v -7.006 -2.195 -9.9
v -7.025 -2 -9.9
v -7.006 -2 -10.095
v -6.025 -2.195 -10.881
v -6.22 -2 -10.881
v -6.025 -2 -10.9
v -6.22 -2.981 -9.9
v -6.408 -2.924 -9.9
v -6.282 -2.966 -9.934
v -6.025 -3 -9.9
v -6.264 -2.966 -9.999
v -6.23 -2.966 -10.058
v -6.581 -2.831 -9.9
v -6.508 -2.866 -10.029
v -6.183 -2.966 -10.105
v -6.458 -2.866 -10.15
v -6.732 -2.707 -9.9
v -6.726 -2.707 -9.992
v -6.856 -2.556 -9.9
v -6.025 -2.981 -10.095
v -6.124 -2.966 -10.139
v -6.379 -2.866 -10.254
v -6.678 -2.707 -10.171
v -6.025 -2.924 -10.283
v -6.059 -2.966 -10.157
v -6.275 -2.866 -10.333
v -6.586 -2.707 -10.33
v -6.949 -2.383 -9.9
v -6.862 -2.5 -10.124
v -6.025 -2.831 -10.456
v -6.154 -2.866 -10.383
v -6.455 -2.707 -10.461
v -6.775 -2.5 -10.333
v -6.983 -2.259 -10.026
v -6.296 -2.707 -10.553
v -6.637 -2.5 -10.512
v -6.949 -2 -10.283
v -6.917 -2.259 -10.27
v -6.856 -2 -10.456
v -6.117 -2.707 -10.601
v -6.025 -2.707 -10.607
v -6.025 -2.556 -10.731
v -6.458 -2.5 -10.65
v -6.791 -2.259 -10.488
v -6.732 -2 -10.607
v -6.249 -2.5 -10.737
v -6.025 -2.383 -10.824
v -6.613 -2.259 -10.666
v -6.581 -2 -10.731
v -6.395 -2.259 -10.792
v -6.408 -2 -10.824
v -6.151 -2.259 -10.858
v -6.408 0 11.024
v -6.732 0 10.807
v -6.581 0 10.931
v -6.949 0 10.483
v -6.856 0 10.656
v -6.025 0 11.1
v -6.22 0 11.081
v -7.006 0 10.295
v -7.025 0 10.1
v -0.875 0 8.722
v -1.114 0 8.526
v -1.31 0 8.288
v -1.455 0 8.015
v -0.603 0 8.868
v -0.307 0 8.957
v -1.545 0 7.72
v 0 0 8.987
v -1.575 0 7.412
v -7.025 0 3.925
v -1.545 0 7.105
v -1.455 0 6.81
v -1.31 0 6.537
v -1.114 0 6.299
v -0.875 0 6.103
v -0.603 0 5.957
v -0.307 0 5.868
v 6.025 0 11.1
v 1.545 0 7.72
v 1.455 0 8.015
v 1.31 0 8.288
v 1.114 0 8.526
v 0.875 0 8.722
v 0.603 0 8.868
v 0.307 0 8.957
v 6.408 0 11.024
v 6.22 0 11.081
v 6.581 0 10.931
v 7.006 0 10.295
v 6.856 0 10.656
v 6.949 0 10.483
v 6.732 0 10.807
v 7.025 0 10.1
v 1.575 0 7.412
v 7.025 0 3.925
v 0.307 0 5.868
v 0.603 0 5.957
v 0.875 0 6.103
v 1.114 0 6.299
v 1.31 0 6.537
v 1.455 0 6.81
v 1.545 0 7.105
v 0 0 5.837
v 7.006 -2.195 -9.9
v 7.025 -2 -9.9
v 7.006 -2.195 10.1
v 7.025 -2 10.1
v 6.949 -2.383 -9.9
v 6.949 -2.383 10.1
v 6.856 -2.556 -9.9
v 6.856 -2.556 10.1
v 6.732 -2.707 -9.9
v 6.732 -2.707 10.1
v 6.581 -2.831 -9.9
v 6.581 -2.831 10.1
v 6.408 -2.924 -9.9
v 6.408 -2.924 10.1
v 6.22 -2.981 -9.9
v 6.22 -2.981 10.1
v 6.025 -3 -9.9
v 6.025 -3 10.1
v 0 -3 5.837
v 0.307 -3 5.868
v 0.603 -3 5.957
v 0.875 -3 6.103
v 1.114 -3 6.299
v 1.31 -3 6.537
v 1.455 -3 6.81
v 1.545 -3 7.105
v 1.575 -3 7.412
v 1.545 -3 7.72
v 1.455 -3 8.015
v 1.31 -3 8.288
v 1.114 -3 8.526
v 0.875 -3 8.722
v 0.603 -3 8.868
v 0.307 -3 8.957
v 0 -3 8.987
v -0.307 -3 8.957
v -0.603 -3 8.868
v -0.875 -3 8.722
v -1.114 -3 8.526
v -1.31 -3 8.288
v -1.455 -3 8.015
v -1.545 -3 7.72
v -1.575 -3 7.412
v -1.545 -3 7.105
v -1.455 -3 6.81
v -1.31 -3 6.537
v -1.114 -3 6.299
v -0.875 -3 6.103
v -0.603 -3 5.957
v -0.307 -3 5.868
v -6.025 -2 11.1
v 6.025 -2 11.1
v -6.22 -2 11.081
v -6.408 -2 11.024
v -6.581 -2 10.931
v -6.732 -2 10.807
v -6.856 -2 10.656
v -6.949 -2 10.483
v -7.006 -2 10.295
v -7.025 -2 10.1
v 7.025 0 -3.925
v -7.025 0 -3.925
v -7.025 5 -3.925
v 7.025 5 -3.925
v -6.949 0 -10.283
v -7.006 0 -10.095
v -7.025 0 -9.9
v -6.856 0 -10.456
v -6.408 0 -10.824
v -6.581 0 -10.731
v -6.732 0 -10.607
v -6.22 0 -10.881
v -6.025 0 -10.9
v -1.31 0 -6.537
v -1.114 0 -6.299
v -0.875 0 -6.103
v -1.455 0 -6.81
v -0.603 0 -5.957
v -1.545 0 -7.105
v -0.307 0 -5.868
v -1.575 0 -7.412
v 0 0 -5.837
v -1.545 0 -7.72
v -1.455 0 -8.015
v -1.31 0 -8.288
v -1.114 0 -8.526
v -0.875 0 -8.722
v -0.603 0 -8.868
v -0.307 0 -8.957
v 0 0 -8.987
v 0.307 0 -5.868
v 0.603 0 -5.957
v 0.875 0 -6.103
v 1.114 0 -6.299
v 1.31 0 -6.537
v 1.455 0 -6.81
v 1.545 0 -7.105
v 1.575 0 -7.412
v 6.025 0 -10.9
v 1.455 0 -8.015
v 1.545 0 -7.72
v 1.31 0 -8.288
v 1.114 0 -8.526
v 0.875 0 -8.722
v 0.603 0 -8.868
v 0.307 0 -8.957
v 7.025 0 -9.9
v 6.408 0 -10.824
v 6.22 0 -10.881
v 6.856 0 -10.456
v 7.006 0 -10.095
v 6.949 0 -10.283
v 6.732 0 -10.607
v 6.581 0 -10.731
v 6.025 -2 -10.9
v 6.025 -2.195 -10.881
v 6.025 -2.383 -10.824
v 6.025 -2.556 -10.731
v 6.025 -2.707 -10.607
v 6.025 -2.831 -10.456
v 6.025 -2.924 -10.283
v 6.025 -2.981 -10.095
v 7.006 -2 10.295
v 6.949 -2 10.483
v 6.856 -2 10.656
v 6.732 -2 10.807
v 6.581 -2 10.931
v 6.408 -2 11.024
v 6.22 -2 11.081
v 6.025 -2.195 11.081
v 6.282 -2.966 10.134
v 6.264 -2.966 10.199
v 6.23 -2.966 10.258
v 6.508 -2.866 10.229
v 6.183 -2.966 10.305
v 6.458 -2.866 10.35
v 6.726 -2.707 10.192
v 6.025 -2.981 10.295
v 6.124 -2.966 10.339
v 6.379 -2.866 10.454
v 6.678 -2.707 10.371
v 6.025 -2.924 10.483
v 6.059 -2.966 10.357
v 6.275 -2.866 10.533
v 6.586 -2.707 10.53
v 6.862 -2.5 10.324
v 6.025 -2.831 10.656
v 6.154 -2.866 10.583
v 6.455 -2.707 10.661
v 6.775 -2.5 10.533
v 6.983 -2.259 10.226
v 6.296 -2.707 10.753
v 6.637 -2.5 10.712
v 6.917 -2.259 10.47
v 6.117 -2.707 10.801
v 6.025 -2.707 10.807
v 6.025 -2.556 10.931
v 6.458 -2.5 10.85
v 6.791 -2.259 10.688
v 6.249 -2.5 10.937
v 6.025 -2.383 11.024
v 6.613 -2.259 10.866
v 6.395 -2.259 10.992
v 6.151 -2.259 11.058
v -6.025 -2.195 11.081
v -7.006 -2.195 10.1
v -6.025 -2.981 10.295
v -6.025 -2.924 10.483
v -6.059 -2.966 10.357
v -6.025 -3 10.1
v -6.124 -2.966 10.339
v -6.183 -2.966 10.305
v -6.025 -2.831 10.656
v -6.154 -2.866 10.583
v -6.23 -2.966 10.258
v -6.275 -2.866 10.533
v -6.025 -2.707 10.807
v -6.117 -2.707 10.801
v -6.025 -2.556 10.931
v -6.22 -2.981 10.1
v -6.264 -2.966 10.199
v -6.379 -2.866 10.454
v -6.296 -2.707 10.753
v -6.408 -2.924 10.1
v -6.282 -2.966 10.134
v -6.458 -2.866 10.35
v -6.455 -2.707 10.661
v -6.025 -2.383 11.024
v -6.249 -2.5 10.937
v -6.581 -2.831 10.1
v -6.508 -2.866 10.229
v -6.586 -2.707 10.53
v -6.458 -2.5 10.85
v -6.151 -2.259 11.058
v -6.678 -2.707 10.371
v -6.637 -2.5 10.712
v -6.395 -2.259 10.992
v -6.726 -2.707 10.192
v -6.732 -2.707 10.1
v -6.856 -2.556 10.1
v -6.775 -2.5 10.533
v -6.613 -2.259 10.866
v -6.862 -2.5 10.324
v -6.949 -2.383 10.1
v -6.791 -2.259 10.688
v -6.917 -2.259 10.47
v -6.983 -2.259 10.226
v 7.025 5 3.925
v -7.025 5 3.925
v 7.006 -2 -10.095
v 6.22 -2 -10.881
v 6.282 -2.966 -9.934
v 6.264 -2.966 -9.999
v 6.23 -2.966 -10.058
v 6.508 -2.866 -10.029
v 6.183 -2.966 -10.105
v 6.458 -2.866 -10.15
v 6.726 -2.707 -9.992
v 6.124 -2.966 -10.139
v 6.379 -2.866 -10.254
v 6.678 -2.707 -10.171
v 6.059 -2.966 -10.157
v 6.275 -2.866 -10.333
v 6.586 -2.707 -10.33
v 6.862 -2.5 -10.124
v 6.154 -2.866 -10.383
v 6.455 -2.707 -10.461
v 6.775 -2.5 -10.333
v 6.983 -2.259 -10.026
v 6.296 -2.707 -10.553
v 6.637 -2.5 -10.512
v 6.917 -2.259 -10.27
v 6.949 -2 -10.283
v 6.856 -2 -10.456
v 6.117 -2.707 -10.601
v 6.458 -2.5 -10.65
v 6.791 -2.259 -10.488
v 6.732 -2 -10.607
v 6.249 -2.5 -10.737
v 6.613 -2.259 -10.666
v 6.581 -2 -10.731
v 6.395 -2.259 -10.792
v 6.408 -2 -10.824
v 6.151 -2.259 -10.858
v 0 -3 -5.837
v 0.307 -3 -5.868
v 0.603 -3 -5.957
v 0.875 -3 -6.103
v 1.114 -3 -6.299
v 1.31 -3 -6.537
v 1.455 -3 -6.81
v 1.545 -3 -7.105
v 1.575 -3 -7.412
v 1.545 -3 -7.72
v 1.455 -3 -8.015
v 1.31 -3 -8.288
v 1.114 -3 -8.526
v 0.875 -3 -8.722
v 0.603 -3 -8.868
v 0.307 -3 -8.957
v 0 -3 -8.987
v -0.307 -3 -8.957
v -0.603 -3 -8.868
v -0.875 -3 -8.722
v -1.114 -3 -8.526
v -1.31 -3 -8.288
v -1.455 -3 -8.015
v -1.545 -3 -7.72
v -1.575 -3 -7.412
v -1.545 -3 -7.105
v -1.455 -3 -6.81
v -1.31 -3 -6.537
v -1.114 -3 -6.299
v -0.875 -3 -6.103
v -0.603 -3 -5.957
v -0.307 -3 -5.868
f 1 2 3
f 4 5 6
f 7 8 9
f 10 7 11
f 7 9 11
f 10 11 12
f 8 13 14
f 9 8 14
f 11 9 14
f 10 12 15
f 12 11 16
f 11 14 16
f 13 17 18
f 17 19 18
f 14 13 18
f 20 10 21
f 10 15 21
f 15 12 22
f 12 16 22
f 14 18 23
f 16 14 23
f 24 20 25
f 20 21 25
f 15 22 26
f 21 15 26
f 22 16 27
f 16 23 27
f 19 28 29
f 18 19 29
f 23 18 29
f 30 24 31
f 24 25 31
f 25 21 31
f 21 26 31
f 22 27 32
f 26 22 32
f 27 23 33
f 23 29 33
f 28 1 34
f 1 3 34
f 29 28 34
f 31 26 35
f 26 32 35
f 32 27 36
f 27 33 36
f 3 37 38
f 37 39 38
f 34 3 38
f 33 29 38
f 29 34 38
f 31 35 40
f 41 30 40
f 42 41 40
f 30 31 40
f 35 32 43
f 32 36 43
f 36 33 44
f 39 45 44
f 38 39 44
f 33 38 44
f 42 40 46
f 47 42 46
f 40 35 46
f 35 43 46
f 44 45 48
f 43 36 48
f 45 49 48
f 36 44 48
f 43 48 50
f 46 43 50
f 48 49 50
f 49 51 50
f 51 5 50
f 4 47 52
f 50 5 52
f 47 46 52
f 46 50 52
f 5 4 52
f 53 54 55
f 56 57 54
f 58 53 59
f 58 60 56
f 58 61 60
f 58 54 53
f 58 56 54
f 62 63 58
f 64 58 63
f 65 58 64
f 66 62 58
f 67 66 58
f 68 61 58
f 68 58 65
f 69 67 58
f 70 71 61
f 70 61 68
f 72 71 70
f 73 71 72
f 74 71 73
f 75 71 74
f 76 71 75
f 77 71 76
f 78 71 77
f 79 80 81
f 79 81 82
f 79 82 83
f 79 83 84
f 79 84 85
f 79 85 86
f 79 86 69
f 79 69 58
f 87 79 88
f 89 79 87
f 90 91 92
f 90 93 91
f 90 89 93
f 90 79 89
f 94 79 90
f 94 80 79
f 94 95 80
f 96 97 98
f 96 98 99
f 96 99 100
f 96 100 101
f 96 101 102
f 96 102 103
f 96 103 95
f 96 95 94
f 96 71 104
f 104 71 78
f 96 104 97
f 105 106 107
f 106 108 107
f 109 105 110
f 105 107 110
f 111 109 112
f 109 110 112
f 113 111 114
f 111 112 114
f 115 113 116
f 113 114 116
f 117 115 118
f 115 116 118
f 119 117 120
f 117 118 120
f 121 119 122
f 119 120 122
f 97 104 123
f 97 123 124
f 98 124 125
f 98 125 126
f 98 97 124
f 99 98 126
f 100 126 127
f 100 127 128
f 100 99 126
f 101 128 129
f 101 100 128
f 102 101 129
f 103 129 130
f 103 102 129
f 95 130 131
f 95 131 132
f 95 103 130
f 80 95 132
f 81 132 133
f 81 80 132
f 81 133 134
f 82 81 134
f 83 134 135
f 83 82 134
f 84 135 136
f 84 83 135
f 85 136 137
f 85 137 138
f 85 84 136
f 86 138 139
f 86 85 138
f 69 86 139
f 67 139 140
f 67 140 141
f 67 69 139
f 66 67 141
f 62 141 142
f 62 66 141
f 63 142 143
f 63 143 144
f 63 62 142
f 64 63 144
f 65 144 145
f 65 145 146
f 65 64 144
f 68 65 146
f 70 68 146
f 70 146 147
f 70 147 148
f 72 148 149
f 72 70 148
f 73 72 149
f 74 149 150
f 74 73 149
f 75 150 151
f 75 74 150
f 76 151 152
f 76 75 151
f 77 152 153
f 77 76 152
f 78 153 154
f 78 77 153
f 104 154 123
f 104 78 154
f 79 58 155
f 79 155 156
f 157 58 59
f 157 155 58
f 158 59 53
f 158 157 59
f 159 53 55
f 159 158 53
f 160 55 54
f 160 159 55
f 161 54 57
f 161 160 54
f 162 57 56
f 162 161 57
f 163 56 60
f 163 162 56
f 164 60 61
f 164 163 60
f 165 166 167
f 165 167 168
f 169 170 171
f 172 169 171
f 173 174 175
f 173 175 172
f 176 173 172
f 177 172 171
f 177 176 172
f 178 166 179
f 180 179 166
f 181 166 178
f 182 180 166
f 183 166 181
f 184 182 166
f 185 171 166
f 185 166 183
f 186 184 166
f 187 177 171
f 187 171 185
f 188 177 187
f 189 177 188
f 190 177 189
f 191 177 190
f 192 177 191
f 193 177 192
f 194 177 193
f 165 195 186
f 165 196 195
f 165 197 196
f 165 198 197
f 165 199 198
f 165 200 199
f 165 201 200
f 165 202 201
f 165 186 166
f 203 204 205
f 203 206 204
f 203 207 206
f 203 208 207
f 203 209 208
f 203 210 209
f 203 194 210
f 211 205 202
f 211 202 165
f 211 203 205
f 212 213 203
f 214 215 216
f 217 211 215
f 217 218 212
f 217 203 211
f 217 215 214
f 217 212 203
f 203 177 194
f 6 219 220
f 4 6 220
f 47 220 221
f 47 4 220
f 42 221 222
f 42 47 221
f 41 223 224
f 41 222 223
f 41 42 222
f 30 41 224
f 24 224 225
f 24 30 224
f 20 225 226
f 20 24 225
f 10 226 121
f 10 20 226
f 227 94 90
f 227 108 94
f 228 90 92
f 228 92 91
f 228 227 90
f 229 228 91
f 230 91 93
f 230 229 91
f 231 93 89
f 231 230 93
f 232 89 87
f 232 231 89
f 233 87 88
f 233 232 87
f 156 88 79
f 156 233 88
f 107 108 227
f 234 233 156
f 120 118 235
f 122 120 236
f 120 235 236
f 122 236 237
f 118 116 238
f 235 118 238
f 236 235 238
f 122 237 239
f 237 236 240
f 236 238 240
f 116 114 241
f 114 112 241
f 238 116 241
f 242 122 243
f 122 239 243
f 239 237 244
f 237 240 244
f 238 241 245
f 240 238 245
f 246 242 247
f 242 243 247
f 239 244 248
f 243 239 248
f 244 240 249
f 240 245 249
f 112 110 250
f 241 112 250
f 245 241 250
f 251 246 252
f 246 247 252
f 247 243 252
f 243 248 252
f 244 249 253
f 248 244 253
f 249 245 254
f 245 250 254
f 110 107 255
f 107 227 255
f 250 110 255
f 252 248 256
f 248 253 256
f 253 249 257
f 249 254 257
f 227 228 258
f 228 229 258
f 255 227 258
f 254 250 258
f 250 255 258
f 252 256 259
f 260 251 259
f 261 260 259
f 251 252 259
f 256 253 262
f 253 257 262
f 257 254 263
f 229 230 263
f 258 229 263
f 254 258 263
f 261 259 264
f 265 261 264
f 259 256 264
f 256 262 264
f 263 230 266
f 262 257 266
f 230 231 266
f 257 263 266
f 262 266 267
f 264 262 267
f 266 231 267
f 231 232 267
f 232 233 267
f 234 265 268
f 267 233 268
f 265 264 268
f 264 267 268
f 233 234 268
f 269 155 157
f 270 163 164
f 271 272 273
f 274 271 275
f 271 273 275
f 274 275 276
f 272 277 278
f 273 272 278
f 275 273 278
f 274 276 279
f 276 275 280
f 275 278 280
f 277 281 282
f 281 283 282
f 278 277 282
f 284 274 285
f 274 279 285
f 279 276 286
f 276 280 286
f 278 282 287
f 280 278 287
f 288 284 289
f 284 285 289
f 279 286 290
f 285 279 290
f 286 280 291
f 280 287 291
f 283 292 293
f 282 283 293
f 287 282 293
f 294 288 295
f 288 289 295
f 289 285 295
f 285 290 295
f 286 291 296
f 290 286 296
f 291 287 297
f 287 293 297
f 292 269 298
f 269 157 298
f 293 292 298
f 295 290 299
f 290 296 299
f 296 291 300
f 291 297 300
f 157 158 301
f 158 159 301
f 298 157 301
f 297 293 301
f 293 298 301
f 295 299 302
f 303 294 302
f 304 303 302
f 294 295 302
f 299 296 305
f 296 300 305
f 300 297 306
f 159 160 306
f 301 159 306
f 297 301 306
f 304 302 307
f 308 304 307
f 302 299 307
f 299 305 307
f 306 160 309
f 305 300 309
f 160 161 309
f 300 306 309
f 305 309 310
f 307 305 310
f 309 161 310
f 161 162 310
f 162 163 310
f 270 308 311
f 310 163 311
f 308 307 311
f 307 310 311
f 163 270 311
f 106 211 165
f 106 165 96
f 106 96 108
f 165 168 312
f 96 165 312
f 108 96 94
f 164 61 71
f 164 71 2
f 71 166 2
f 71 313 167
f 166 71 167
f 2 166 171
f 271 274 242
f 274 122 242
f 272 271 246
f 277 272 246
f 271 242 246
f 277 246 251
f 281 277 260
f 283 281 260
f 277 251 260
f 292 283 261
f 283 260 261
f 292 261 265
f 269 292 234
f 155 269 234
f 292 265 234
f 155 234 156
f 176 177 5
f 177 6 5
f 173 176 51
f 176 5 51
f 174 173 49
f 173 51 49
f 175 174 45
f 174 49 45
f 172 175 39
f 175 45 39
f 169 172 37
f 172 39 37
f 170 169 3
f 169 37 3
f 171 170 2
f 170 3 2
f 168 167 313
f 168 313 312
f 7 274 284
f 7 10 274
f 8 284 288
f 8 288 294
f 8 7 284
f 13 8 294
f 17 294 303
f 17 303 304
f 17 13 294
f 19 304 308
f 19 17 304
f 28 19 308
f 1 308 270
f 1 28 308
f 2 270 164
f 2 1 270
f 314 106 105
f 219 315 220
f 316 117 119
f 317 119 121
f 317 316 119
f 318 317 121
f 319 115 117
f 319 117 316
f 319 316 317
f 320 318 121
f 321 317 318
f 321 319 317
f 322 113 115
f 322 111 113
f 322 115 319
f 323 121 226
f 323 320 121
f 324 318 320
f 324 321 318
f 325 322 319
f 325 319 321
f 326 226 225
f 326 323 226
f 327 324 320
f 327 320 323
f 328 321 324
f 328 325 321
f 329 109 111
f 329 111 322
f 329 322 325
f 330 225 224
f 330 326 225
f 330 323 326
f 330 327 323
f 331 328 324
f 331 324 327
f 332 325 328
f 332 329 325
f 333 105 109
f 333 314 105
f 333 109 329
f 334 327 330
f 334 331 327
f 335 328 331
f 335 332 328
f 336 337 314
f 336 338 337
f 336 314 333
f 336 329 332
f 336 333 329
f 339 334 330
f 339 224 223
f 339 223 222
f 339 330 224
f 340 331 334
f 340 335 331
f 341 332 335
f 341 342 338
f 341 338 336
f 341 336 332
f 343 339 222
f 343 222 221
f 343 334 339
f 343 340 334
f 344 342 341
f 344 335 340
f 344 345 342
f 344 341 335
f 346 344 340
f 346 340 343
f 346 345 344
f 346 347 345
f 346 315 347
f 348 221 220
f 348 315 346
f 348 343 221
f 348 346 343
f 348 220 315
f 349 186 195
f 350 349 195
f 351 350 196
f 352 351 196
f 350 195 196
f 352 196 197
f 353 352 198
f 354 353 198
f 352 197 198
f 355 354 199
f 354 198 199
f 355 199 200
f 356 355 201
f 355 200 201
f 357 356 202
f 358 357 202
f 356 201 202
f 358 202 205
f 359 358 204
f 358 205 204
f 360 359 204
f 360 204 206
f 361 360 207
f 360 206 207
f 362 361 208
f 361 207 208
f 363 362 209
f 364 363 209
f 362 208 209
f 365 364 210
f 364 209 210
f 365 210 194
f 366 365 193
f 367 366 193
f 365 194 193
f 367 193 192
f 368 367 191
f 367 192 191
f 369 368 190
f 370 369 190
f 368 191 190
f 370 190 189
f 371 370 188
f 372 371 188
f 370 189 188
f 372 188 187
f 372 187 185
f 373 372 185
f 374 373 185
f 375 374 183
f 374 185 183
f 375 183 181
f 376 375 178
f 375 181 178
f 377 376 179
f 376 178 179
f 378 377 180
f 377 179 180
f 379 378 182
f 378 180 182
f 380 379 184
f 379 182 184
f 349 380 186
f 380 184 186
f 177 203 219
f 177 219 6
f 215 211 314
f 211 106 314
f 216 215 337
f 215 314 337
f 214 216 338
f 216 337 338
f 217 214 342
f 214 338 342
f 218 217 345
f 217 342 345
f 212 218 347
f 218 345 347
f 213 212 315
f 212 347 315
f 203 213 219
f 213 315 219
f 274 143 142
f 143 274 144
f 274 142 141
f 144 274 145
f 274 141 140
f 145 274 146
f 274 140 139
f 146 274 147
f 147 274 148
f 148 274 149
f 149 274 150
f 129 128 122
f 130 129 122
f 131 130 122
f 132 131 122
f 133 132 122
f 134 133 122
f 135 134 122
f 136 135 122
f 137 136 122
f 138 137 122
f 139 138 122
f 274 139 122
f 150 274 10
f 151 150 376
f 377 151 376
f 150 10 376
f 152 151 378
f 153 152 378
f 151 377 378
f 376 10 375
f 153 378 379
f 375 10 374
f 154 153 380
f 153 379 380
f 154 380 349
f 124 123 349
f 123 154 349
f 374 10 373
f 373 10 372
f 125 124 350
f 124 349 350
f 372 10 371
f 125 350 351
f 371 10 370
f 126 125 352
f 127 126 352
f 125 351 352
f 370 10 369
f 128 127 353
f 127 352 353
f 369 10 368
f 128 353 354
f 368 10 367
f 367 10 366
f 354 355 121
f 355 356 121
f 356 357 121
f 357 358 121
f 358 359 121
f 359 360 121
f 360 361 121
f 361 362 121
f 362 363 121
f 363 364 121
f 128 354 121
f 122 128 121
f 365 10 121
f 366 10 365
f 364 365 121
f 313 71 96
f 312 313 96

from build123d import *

# Parameters (mm, degrees)
SKETCH_1_W          = 14.05
SKETCH_1_H          = 7.85
EXTRUDE_1_DEPTH     = 5
EXTRUDE_2_DEPTH     = 3
SKETCH_3_R          = 1.575
CUT_EXTRUDE_1_DEPTH = 3
FILLET_2_R          = 1


with BuildPart() as part:
    # 草图1 → 凸台-拉伸1 (new body)
    with BuildSketch(Plane(origin=(0, 0, 0), x_dir=(1, 0, 0), z_dir=(0, 1, 0))):
        Rectangle(SKETCH_1_W, SKETCH_1_H)
    extrude(amount=EXTRUDE_1_DEPTH)

    # 草图2 → 凸台-拉伸2 (add)
    with BuildSketch(Plane(origin=(0, 0, 0), x_dir=(-1, 0, 0), z_dir=(0, -1, 0))):
        Polygon((-7.025, 3.925), (-7.025, 10.9), (7.025, 10.9), (7.025, 3.925), (7.025, -11.1), (-7.025, -11.1), align=None)
    extrude(amount=EXTRUDE_2_DEPTH)

    # 草图3 → 切除-拉伸1 (cut)
    with BuildSketch(Plane(origin=(0, 0, 0), x_dir=(1, 0, 0), z_dir=(0, 1, 0))):
        with Locations(Location((0, 7.4125, 0), (0, 0, 270))):
            Circle(SKETCH_3_R)
    cut_extrude_1 = extrude(amount=-CUT_EXTRUDE_1_DEPTH, mode=Mode.SUBTRACT)

    # 镜向1: 切除-拉伸1 across plane
    add(cut_extrude_1.mirror(Plane.XY), mode=Mode.SUBTRACT)

    # 圆角2
    fillet_2_edges = [part.edges().sort_by_distance(p)[0] for p in [
        (7.025, -1.5, 11.1),
        (-7.025, -1.5, 11.1),
        (-7.025, -1.5, -10.9),
        (7.025, -1.5, -10.9),
        (7.025, -3, 0.1),
        (0, -3, 11.1),
        (-7.025, -3, 0.1),
        (0, -3, -10.9),
    ]]
    fillet(fillet_2_edges, radius=FILLET_2_R)


solid = part.part
